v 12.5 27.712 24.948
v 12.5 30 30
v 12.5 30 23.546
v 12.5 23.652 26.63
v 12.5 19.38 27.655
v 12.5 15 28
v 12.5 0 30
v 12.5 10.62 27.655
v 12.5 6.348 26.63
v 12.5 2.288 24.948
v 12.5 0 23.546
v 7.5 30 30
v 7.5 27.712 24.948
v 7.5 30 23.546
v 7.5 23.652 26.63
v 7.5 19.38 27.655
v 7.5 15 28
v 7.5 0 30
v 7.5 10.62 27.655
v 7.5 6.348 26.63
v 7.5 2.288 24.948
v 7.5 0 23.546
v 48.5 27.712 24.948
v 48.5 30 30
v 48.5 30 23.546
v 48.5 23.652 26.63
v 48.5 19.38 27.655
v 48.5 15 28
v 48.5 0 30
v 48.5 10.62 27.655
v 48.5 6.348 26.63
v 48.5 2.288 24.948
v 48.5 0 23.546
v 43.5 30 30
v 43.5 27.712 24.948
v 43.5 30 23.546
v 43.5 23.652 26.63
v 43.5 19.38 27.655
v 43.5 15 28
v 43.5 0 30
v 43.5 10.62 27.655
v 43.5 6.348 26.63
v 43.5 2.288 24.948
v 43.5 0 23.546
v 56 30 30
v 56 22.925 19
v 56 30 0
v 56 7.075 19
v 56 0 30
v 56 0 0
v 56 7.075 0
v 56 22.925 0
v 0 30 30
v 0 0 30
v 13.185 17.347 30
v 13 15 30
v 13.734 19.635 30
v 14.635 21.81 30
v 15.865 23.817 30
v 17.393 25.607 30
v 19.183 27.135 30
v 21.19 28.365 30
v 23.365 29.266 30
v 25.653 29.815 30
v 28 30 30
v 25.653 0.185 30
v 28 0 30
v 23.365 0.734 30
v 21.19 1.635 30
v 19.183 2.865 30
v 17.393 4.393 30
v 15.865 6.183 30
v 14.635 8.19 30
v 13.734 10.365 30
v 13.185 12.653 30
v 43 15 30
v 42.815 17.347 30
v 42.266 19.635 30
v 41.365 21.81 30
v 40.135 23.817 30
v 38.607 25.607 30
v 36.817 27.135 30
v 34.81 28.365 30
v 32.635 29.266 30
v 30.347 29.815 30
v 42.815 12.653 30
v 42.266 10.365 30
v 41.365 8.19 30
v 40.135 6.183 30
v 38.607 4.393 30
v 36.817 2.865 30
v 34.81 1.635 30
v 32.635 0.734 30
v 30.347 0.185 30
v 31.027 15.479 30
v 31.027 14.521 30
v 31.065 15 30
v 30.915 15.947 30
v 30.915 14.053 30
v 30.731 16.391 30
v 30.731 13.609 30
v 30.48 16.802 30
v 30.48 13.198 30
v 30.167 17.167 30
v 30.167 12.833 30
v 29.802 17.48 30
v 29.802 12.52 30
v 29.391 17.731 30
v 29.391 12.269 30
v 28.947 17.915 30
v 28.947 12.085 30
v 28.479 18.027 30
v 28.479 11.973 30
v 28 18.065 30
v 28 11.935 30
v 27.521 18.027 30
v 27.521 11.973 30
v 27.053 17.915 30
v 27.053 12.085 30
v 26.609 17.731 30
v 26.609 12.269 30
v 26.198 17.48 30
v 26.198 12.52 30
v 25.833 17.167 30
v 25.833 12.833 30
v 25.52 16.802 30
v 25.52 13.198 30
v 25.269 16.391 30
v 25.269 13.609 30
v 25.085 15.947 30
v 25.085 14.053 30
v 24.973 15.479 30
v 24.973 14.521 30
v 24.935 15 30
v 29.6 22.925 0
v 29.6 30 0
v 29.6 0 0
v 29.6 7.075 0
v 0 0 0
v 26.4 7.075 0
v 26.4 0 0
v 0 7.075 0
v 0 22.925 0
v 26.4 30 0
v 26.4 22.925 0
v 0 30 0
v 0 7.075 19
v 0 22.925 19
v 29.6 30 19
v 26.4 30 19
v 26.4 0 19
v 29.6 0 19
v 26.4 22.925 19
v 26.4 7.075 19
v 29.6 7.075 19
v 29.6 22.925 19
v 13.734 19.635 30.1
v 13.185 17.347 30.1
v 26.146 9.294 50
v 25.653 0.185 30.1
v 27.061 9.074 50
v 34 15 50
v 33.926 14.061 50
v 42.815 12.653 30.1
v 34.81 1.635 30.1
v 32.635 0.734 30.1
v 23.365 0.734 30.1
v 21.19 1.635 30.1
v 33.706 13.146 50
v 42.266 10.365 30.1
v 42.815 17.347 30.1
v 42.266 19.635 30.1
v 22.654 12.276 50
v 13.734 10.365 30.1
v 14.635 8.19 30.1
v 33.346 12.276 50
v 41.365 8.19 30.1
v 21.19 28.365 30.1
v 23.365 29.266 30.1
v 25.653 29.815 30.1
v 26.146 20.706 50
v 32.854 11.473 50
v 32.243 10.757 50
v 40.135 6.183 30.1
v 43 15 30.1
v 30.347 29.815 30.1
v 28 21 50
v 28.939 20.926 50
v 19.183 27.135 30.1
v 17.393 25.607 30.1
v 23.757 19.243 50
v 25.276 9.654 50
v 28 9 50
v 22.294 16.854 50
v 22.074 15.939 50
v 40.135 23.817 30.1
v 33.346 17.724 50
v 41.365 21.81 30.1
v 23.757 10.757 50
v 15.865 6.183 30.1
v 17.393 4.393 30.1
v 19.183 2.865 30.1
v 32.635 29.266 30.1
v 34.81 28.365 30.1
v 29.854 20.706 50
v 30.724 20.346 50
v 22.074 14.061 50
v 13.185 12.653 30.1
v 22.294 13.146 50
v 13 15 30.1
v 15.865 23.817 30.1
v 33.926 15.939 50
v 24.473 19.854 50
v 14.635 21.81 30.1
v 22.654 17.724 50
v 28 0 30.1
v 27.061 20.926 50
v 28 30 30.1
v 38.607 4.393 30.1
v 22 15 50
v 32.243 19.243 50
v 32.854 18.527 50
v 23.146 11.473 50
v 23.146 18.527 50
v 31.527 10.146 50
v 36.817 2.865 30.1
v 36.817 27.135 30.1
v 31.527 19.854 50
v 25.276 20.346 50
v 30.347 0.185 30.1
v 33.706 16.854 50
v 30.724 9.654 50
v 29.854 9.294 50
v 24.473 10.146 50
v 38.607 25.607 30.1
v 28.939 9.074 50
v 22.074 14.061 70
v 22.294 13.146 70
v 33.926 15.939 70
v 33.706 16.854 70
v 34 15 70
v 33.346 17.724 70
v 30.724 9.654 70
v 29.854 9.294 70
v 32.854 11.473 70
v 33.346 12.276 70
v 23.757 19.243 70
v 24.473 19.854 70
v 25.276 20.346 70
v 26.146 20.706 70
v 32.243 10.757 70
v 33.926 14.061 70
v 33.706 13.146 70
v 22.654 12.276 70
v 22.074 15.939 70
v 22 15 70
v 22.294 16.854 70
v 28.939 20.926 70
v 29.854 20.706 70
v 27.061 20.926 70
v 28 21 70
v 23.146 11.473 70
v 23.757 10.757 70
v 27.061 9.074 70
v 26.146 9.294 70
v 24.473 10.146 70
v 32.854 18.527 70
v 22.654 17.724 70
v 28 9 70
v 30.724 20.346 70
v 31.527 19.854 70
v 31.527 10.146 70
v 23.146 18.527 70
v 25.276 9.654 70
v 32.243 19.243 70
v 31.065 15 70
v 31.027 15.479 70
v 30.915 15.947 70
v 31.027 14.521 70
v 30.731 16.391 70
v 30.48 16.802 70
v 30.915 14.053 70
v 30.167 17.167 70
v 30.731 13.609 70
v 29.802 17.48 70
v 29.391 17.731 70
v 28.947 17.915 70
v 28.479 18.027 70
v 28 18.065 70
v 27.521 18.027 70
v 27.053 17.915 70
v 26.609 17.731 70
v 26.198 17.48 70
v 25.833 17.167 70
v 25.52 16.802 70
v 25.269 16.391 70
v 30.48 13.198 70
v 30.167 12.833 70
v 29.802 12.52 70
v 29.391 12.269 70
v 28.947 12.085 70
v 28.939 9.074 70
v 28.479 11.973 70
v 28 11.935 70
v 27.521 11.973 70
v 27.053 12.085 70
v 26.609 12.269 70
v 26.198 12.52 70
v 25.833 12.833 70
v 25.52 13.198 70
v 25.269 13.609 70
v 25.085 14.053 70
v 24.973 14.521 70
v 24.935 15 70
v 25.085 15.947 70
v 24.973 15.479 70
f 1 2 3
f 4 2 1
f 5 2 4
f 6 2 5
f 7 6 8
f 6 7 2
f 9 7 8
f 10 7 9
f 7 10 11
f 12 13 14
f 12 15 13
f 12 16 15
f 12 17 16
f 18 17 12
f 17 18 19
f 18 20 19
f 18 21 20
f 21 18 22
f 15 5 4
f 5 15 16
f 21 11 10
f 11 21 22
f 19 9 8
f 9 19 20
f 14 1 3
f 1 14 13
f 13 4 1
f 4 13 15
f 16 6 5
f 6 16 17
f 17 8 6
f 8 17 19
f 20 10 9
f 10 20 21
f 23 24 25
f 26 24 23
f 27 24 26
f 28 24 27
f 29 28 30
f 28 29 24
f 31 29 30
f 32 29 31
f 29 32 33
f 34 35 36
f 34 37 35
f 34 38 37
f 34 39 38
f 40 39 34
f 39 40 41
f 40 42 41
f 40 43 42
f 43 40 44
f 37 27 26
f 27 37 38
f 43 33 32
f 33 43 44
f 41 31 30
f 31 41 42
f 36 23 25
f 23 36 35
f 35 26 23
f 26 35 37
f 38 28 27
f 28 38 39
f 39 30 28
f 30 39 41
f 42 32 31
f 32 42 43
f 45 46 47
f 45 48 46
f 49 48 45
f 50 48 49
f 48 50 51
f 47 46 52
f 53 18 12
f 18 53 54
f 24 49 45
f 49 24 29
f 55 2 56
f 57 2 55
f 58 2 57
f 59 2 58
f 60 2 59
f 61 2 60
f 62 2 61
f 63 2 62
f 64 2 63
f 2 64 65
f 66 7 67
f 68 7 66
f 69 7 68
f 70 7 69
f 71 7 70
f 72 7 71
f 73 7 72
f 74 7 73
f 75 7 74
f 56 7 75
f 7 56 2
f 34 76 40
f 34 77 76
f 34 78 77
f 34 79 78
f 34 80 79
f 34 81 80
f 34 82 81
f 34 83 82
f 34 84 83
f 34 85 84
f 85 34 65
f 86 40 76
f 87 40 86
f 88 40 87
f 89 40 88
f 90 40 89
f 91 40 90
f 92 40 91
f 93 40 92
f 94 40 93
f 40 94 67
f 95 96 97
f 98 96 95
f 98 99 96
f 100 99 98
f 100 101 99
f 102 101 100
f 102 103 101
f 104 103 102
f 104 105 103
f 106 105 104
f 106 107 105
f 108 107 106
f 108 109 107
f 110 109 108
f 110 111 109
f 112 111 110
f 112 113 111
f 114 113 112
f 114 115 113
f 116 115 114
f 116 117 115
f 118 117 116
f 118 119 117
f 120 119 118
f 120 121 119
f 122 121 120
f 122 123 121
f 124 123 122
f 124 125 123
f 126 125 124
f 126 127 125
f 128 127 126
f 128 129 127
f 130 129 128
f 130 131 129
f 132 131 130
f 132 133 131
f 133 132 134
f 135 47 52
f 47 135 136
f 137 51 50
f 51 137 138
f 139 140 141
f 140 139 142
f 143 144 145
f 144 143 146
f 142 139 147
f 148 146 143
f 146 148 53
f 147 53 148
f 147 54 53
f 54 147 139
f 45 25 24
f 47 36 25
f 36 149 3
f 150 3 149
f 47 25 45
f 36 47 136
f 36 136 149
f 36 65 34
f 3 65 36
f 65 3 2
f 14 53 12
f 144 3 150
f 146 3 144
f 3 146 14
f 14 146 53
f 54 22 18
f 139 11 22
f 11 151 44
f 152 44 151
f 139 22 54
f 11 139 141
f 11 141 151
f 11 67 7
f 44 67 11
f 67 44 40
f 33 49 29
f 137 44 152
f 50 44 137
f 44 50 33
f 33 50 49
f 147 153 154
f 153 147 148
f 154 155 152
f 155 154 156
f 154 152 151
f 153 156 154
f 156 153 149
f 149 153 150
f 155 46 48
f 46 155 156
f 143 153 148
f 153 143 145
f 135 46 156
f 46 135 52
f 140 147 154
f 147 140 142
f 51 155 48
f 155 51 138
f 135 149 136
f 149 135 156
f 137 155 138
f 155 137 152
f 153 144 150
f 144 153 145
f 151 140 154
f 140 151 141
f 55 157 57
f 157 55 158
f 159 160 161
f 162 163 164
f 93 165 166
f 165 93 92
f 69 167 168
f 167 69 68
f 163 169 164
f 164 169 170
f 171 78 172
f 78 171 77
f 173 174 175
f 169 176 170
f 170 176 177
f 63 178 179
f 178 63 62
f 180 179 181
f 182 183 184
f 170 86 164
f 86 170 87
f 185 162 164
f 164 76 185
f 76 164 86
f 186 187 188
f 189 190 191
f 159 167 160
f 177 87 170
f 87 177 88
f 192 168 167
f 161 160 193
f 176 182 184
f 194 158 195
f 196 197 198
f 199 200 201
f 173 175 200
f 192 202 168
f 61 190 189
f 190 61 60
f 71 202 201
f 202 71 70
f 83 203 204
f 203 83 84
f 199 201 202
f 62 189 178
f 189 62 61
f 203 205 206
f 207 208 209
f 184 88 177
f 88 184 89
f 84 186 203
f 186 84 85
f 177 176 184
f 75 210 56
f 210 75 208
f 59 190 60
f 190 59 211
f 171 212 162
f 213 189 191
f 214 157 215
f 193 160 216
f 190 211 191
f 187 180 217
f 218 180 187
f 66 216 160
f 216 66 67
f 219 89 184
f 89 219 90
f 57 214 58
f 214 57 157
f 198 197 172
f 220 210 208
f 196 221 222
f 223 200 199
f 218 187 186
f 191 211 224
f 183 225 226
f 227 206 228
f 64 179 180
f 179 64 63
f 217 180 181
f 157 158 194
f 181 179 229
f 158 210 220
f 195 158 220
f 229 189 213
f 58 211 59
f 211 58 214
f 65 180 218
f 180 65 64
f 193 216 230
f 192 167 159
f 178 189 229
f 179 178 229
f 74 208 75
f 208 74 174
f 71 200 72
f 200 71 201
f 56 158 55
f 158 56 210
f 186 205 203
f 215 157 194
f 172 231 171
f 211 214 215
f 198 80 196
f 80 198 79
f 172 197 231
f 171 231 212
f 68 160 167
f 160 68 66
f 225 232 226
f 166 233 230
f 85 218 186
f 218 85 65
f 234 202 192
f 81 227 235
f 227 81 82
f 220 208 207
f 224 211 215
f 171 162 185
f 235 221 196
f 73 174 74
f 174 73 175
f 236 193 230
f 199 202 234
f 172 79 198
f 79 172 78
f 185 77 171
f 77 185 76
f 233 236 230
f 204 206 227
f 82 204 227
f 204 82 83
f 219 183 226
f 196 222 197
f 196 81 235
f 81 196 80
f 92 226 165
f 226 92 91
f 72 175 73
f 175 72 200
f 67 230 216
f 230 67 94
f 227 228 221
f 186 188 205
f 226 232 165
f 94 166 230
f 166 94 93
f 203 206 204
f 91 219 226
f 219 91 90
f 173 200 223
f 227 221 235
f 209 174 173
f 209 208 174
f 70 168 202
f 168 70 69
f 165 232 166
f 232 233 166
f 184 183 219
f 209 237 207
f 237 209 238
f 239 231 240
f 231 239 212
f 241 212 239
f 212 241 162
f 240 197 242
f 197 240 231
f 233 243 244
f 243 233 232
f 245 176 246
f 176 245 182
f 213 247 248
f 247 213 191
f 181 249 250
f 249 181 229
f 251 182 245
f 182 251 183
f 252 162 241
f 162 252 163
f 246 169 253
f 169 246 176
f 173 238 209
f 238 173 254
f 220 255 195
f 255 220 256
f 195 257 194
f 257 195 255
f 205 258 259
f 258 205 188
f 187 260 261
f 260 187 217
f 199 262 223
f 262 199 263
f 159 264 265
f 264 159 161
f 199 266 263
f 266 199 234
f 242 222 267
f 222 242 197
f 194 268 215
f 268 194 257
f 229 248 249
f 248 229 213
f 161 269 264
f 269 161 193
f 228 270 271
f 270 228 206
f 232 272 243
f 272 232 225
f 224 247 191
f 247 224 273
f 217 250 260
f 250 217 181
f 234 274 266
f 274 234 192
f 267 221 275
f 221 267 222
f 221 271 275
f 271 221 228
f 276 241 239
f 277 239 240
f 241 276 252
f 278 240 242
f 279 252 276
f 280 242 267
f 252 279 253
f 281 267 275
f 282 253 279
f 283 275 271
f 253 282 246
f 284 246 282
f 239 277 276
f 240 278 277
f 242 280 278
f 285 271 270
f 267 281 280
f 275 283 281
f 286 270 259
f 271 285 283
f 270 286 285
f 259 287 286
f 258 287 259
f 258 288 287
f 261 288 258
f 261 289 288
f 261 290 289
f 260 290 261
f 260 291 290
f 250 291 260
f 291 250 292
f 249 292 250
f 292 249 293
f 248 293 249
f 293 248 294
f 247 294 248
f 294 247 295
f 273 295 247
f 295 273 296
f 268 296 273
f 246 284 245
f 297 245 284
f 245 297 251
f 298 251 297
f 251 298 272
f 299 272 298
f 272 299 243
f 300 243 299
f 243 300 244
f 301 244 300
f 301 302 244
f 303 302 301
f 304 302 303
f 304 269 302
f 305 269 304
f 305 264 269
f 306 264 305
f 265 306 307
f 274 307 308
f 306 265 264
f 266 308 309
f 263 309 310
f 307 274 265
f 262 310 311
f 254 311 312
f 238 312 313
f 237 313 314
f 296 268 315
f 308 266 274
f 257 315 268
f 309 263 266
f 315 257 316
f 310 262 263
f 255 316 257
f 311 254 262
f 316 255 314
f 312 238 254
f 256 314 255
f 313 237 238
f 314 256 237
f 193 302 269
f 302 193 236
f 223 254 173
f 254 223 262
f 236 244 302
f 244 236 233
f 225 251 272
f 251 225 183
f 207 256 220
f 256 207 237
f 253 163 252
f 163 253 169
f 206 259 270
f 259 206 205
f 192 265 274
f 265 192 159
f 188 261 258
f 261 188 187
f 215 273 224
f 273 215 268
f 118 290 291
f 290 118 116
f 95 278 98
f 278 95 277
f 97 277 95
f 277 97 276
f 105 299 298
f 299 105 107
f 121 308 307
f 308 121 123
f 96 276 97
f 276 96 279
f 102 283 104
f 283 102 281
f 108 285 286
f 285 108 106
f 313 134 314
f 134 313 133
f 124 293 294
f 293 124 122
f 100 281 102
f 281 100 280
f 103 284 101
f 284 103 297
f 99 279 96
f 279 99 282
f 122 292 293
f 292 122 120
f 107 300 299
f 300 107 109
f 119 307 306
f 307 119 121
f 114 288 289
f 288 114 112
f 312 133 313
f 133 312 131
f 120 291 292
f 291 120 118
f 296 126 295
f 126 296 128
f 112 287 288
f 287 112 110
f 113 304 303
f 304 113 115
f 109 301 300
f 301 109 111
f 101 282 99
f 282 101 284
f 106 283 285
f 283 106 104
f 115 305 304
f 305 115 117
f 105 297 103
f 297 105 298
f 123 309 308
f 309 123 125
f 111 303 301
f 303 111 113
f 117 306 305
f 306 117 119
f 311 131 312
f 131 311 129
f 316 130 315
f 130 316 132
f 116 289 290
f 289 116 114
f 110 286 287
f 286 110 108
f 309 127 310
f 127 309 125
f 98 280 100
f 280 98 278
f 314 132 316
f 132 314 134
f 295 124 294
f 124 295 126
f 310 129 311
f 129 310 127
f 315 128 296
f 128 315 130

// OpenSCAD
$fn = 40;

LENGTH = 56;
WIDTH = 30;
HEIGHT = 30;
THICKNESS = 10;

X = 15.85;
Y = 3.2;

TUBE_INNER_DIAMETER = 6.13;
TUBE_OUTER_DIAMETER = 12;
TUBE_HEIGHT = 40;

module cap() {
    difference() {
        union() {
            hull() {
                cylinder(r=WIDTH / 2, h=0.1);
                cylinder(r=TUBE_OUTER_DIAMETER / 2, h=TUBE_HEIGHT / 2);
            }
            cylinder(r=TUBE_OUTER_DIAMETER / 2, h=TUBE_HEIGHT);
        }
        translate([0, 0, -1]) {
            cylinder(r=TUBE_INNER_DIAMETER / 2, h=TUBE_HEIGHT * 2);
        }
    }
}

module base() {
    difference() {
        cube(size=[LENGTH, WIDTH, HEIGHT]);

        translate([-1, WIDTH / 2 - X / 2, -1]) {
            cube(size=[LENGTH * 2, X, HEIGHT - THICKNESS]);
        }

        translate([LENGTH / 2 - Y / 2, -1, -1]) {
            cube(size=[Y, WIDTH * 2, HEIGHT - THICKNESS]);
        }

        for (x = [10, LENGTH - 10]) {
            translate([x, WIDTH / 2, 0]) {
                rotate([0, 90, 0]) {
                    difference() {
                        cylinder(r=35, h=5, center=true);
                        cylinder(r=28, h=5, center=true);
                    }
                }
            }
        }
    }
}

module main() {
    base();

    translate([LENGTH / 2, WIDTH / 2, HEIGHT]) {
        cap();
    }
}



cap();
intersection() { translate([0, 0, 11]) cube(size=[100, 100, 10]); base();}
!main();
